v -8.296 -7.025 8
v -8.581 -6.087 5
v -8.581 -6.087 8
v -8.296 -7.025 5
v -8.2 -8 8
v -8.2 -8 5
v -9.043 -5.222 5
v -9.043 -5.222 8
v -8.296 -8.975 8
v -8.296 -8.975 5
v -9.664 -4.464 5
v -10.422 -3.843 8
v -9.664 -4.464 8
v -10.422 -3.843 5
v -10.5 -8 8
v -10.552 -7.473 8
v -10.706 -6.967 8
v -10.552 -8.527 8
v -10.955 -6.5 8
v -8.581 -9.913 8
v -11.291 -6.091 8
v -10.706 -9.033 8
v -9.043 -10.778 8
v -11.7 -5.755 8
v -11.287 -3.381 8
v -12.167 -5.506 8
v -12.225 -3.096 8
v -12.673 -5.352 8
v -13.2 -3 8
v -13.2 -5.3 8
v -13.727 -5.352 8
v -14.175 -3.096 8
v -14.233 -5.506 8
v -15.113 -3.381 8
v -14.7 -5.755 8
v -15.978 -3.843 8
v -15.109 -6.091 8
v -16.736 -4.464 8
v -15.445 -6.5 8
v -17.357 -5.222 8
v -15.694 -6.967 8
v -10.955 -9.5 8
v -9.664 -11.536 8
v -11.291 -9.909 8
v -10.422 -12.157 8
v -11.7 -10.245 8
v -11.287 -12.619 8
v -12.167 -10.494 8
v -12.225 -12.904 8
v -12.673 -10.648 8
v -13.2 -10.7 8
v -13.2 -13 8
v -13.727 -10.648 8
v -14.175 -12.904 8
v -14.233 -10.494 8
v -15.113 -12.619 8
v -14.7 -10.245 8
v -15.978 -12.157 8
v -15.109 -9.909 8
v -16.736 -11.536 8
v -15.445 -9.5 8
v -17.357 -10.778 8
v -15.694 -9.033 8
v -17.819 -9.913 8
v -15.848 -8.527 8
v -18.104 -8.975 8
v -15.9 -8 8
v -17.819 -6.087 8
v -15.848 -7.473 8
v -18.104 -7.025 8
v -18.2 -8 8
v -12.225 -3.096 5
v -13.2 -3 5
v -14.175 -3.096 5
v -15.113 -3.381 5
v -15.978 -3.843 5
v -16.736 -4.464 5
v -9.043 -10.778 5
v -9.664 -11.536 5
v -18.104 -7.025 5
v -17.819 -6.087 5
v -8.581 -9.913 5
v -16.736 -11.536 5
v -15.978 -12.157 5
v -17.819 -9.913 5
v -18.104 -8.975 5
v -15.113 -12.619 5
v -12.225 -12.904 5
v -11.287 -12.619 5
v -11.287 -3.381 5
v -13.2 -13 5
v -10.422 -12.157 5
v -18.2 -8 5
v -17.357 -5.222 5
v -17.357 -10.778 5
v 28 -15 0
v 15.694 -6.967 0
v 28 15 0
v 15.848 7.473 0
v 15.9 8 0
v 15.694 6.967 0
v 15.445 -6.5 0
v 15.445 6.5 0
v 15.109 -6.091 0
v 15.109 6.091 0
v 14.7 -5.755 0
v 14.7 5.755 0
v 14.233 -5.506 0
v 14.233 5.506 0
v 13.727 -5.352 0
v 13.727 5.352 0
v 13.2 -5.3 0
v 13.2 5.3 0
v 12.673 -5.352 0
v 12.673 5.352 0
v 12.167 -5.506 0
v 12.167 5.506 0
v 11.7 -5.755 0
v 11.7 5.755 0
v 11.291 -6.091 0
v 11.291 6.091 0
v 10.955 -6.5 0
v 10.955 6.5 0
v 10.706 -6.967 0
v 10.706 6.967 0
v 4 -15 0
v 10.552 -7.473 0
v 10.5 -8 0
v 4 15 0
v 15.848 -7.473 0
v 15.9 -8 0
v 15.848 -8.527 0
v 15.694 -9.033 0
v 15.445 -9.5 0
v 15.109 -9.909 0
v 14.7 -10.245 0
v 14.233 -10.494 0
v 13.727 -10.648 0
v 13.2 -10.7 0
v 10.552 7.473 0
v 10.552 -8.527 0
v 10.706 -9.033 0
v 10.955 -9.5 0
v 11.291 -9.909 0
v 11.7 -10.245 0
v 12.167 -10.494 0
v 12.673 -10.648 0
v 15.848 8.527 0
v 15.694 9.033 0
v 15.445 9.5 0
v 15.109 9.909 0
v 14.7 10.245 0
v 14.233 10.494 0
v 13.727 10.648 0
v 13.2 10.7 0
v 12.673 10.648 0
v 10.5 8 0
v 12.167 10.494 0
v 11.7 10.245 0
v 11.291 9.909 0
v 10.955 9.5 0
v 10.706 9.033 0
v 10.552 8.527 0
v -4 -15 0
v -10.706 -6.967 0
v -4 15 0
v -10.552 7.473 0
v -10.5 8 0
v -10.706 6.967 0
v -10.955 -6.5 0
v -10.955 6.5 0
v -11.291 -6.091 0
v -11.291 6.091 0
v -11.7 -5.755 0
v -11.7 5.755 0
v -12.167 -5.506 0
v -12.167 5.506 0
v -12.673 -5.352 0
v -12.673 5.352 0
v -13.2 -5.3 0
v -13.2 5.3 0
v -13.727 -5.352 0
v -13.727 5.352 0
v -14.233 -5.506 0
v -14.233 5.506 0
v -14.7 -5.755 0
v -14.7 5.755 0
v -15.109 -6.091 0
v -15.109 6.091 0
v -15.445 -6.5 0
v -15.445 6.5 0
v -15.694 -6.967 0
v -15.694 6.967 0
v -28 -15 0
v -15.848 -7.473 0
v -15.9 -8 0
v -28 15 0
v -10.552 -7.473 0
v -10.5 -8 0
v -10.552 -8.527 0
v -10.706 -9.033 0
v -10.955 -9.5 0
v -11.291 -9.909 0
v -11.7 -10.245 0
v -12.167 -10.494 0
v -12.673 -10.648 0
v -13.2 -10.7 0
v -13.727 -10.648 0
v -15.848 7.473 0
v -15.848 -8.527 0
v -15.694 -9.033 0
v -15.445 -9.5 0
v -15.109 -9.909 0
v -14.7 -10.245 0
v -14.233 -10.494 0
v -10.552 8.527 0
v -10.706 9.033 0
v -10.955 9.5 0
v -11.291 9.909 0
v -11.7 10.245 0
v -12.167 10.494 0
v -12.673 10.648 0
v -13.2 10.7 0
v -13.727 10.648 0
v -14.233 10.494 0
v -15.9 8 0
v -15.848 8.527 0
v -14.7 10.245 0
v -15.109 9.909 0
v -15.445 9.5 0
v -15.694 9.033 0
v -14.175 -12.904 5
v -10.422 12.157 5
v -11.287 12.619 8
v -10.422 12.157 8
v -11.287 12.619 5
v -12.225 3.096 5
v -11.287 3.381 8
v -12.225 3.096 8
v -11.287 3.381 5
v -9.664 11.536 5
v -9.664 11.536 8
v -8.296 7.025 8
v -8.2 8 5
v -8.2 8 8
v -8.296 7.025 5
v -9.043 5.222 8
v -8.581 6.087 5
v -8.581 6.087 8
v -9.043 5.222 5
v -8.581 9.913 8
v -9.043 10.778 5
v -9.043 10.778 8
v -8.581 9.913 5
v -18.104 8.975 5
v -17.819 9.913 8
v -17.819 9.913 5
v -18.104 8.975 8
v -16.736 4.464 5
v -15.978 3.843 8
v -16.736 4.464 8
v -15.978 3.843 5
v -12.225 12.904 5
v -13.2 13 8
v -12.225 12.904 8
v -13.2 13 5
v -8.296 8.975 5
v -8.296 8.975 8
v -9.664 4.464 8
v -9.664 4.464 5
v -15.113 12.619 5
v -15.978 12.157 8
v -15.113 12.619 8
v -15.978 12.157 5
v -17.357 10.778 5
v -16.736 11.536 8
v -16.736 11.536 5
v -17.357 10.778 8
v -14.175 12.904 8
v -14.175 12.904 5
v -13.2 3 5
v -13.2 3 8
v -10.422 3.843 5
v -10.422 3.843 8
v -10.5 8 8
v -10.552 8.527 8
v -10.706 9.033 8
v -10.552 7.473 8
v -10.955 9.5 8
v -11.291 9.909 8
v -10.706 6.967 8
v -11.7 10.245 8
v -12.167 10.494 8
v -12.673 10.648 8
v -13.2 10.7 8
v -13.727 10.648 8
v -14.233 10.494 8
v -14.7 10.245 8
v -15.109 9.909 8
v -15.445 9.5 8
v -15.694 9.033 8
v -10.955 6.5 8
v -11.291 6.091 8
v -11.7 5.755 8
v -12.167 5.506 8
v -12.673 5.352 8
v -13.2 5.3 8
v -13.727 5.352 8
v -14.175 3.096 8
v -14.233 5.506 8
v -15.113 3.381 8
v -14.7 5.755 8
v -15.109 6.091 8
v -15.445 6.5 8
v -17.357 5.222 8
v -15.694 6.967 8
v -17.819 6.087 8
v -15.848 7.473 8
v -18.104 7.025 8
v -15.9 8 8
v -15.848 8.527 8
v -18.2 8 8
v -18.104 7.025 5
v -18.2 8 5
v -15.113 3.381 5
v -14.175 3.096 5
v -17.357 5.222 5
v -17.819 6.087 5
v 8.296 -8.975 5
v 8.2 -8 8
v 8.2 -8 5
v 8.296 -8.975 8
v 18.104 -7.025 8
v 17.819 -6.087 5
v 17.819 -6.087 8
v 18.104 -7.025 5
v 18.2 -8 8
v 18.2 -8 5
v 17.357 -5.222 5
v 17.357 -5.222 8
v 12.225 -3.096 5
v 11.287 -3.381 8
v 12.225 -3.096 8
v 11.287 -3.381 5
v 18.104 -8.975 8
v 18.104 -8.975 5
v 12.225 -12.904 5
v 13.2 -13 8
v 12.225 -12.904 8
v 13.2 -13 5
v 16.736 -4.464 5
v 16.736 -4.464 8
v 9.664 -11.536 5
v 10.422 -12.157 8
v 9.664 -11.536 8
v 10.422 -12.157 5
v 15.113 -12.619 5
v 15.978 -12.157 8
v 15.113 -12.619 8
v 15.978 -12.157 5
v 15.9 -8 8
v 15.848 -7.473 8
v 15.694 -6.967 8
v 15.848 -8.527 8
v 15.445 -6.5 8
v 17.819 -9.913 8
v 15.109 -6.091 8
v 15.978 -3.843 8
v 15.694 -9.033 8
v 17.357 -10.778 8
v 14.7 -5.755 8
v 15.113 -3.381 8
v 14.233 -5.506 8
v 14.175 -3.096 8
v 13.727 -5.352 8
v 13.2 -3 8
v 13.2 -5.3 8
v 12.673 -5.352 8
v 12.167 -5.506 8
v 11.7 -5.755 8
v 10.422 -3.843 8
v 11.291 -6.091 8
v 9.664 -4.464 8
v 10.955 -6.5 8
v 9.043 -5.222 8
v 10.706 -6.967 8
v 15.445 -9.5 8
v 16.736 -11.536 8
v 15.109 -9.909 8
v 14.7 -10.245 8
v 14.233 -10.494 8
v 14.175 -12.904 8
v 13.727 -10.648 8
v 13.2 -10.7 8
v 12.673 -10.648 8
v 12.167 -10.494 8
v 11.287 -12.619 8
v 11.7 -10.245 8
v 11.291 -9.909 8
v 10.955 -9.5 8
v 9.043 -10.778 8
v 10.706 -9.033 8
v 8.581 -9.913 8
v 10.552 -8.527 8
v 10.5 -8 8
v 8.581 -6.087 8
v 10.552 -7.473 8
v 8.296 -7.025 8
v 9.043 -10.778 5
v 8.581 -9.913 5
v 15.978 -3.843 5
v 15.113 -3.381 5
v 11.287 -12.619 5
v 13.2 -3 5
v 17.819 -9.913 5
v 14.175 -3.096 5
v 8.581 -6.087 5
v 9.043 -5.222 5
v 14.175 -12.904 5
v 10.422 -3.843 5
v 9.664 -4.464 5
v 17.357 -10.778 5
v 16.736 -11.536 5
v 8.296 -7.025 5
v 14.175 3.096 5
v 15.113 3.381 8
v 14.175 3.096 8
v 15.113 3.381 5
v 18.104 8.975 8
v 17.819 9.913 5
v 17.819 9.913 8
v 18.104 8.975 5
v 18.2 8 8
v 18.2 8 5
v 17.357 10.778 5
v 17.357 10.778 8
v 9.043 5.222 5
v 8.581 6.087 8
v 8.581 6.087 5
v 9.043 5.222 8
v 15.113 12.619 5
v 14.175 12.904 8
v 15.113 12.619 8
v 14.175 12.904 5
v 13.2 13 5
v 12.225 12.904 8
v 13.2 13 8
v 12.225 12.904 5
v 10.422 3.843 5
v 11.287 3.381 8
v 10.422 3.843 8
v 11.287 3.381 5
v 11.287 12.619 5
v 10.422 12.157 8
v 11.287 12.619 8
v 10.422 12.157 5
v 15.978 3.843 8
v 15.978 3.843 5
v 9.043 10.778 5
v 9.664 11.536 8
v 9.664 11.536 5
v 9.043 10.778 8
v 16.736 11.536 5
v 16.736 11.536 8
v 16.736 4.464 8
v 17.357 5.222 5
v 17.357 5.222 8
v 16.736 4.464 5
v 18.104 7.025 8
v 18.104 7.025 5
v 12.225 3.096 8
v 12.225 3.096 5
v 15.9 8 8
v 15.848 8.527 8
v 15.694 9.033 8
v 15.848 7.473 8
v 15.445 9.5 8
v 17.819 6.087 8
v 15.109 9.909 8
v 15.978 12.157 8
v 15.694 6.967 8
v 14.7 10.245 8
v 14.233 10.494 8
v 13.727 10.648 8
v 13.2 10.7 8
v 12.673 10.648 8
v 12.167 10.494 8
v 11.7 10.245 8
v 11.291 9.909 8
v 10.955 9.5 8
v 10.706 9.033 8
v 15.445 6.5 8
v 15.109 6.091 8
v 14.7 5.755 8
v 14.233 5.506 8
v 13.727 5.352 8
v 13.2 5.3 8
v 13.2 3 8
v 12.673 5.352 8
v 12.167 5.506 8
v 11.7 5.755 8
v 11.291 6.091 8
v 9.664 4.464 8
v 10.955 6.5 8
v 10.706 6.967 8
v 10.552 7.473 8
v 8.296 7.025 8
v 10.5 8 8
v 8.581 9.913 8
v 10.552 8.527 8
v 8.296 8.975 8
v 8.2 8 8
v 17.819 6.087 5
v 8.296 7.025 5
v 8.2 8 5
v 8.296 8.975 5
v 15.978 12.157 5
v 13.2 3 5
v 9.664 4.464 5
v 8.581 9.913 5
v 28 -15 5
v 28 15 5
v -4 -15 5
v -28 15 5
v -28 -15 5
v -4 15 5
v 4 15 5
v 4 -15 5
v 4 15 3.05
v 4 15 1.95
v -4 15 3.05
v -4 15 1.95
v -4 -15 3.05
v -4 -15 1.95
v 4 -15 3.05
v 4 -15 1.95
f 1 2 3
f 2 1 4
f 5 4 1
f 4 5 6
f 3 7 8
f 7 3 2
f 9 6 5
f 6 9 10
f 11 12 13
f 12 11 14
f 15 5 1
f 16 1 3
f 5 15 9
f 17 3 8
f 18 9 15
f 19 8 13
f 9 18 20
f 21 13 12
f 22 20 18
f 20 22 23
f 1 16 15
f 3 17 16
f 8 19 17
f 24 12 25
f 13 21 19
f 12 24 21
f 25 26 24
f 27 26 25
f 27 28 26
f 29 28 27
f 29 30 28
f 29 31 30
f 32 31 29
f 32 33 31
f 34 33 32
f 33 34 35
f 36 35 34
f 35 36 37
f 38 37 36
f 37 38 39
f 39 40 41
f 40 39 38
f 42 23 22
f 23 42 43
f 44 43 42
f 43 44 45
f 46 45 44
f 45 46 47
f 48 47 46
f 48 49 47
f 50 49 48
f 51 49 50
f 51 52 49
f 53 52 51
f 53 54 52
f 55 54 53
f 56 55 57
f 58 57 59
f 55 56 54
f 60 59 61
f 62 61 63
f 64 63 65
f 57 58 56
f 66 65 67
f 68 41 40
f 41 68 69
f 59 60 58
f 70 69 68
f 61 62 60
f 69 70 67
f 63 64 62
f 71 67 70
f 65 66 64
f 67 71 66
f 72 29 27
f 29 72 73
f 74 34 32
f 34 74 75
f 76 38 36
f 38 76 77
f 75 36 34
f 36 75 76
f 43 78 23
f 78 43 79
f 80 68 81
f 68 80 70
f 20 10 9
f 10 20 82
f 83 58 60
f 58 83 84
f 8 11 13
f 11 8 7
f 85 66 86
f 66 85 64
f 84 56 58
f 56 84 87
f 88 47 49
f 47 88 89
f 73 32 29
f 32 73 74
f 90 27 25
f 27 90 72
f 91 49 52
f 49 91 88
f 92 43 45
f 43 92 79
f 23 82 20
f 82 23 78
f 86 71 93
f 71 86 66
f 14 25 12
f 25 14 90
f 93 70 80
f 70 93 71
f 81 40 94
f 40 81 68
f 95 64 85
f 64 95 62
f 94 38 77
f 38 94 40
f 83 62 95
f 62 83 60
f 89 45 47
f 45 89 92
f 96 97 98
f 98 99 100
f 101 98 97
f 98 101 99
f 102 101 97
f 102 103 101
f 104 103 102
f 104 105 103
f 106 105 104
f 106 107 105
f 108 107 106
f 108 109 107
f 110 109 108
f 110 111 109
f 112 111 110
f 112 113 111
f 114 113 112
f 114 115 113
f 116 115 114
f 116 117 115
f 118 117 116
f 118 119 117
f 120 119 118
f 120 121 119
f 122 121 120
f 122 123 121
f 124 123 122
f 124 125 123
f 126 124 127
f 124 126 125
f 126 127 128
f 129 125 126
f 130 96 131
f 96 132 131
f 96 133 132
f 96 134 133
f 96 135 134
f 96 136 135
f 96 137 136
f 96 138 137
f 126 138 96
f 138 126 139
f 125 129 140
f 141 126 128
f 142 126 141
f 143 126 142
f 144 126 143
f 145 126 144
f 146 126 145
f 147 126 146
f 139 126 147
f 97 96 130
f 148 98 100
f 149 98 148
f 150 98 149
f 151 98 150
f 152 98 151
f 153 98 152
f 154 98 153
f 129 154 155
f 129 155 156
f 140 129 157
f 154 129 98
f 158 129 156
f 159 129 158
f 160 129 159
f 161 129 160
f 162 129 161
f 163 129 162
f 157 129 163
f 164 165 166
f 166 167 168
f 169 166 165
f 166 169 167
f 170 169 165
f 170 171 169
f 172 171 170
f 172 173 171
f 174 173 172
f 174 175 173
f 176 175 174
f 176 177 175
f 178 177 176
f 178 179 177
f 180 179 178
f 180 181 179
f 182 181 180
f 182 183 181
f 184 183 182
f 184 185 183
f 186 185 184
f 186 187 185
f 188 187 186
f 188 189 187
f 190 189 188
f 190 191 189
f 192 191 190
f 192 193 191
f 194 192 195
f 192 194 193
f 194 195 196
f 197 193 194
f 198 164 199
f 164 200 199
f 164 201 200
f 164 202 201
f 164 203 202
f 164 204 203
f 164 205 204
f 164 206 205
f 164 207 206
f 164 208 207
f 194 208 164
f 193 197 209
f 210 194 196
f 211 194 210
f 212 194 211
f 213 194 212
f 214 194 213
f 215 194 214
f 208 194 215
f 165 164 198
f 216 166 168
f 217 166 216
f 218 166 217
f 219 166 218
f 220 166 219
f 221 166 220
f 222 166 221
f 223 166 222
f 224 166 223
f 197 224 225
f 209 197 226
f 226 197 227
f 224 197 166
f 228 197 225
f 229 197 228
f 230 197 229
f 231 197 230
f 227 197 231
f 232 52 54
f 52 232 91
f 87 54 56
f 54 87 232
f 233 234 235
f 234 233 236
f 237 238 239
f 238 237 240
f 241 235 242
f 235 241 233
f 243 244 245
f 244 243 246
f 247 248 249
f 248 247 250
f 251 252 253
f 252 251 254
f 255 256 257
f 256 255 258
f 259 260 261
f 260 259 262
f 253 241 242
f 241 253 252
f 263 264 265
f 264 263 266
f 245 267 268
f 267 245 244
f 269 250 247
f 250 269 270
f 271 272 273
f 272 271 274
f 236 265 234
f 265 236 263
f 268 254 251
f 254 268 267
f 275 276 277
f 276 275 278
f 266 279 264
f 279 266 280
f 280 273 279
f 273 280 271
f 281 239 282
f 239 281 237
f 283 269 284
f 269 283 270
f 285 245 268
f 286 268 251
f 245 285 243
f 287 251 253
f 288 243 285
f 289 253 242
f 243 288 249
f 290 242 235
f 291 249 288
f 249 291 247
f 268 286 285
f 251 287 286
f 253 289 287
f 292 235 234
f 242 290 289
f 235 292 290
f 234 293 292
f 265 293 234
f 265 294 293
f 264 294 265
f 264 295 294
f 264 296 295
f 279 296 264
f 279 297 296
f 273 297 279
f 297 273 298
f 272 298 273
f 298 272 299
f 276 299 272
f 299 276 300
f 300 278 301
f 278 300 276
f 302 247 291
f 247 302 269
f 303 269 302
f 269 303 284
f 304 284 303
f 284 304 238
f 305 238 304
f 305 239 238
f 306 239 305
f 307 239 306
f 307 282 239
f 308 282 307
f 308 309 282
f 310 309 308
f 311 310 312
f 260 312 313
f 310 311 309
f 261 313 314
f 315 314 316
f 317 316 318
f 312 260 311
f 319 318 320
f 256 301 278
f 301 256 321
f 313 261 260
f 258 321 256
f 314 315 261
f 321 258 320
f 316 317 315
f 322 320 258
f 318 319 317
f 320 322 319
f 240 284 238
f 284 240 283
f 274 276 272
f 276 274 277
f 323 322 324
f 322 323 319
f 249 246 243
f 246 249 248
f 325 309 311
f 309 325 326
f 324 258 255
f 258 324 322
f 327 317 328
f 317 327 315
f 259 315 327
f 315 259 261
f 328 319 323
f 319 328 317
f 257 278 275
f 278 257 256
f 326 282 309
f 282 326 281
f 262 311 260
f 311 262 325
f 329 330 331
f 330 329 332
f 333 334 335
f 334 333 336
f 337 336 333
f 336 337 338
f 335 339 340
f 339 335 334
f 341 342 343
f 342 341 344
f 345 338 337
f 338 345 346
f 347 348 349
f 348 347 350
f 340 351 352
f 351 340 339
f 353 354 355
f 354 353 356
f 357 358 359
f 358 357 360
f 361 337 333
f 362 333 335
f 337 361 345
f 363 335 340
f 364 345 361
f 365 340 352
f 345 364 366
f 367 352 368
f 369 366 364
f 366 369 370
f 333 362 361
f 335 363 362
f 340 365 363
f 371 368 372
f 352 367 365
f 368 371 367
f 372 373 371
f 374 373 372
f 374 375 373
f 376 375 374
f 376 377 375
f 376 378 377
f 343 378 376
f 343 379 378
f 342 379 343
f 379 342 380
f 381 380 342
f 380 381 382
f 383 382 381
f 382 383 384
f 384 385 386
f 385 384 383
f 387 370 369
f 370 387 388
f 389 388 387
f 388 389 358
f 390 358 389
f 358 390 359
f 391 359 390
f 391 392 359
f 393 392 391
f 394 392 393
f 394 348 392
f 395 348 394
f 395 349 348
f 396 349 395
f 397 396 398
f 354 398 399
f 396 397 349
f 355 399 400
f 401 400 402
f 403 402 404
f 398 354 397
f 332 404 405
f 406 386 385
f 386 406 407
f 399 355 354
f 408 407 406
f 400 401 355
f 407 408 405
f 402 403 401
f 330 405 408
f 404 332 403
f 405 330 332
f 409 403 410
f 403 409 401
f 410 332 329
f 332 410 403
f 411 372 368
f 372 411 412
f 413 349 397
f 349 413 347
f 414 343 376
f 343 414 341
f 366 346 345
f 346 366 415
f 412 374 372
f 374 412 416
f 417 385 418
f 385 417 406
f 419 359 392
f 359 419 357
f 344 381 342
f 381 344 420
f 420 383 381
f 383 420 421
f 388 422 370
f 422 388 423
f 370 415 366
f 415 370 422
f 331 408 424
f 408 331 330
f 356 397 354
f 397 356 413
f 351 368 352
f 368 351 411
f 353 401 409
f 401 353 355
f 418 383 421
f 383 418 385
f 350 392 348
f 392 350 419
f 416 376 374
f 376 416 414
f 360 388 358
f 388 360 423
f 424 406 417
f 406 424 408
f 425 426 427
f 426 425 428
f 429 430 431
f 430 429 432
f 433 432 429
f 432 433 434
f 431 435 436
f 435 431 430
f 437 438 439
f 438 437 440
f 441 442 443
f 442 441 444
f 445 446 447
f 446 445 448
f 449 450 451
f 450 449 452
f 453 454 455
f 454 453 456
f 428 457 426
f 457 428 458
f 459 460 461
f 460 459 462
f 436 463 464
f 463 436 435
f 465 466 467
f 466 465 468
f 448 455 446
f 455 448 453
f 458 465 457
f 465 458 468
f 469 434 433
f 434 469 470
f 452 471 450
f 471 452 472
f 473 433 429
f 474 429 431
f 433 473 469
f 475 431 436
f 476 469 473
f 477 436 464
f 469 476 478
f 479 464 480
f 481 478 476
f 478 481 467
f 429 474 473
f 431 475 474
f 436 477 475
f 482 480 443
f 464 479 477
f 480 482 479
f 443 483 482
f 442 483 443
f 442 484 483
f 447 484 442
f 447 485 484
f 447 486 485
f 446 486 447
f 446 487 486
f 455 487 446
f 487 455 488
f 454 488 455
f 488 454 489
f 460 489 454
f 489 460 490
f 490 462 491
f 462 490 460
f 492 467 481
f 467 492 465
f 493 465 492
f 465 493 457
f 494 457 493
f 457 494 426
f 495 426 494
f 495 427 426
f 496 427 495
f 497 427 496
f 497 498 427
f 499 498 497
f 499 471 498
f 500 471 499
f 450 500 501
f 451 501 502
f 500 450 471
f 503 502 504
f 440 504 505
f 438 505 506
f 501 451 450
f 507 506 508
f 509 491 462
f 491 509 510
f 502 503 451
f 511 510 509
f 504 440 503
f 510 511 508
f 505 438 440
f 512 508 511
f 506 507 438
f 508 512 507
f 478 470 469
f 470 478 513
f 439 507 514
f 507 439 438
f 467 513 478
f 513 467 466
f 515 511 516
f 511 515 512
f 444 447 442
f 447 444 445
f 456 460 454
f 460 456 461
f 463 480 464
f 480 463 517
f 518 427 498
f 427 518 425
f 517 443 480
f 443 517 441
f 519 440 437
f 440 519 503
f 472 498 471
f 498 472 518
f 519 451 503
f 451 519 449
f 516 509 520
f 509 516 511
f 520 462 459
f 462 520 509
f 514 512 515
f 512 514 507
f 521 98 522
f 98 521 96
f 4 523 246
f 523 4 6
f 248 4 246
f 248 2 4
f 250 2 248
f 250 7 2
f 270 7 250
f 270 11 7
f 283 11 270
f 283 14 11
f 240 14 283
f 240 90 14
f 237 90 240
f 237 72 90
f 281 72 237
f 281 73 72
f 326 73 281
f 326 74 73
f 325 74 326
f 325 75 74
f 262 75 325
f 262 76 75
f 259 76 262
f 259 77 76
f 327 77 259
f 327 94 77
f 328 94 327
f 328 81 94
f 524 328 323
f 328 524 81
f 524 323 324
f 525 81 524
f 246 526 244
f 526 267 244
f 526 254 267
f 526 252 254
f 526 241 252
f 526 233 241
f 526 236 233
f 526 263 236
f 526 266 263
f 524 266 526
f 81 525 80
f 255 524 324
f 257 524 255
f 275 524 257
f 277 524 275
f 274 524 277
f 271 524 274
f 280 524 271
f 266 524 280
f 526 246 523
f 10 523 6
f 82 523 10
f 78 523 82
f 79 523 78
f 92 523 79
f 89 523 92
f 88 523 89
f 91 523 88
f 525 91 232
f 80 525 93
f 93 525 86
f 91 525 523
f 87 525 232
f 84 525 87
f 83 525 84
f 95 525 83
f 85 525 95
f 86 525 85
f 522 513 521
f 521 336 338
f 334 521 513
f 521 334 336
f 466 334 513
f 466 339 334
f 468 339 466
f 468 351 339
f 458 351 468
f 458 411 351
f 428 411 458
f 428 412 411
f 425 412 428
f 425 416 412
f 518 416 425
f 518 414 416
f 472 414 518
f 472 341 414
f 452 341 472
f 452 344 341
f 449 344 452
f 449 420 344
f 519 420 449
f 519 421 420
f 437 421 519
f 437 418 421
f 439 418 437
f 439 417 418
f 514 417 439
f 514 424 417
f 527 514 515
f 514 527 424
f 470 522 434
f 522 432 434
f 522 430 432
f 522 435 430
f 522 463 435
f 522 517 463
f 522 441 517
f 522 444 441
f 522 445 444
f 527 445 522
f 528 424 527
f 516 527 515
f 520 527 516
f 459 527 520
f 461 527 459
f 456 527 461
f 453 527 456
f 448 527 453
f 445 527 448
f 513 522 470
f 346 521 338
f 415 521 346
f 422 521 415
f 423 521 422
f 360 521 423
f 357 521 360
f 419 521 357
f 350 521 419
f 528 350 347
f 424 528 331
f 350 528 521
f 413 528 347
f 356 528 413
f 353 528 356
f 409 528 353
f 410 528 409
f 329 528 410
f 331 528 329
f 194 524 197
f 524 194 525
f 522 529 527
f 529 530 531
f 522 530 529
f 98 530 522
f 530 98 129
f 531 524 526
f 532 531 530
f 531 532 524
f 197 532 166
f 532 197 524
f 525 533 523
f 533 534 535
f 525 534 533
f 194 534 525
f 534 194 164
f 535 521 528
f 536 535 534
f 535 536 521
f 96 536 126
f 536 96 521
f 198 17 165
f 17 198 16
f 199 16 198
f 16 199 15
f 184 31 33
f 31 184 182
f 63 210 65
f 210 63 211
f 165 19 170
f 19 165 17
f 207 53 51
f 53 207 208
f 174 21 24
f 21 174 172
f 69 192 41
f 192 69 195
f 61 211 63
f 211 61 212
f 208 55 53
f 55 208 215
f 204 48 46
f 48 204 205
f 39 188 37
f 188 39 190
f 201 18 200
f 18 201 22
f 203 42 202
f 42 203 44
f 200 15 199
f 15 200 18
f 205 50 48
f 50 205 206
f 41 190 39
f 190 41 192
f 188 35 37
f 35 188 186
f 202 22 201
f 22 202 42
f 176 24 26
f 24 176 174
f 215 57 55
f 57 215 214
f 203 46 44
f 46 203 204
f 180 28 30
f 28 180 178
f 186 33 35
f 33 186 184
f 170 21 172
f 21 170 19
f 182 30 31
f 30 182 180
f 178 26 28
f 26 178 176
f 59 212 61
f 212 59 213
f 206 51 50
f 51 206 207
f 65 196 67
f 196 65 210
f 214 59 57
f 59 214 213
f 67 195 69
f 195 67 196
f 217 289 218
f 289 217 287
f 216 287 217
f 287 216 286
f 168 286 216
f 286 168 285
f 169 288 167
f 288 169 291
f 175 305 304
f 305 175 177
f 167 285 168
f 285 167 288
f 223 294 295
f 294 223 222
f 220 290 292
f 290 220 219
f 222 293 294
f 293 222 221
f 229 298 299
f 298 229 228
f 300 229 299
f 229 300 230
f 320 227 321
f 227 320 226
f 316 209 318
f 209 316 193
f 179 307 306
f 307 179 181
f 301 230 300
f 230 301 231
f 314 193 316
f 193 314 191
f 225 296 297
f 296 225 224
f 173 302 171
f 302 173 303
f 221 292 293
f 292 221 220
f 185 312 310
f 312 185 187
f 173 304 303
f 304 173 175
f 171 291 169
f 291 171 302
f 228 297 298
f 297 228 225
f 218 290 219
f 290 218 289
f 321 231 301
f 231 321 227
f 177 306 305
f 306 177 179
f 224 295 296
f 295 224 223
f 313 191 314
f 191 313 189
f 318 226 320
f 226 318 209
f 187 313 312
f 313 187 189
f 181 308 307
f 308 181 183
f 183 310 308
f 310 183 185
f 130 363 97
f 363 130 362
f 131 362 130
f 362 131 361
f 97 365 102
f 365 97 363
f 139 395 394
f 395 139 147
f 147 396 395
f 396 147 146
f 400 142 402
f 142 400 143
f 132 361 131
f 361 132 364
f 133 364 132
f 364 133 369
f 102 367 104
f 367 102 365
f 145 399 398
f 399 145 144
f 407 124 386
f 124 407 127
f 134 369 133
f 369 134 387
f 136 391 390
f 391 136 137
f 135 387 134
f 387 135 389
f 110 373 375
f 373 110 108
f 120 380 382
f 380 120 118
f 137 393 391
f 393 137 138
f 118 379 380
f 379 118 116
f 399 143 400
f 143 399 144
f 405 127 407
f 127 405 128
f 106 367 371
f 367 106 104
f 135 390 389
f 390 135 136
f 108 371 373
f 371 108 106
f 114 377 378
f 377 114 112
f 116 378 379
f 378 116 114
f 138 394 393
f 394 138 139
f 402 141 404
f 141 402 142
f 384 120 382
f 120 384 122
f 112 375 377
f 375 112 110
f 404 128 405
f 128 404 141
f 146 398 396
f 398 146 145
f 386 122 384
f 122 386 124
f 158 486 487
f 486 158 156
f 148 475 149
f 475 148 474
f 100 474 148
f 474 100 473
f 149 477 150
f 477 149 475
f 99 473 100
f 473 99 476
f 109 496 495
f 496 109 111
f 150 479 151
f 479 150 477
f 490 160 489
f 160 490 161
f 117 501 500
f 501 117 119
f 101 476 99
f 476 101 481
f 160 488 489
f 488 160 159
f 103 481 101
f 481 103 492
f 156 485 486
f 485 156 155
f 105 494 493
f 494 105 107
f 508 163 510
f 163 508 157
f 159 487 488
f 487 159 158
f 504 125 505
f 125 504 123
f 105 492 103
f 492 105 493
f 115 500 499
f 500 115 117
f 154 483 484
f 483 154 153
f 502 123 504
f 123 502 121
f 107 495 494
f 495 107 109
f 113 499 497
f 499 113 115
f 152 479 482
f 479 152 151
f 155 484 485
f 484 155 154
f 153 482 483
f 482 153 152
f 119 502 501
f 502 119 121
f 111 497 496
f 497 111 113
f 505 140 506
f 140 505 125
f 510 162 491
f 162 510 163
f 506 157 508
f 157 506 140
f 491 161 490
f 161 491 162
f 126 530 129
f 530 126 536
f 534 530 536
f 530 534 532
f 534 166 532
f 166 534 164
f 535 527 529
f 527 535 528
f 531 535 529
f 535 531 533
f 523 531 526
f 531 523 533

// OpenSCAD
$fn = 32;

// ----------------------------------------------------------------------
// Living hinge: 56 x 30 mm plates, 1.1 mm flexible web
// ----------------------------------------------------------------------

// --- parameters (mm) ---
plate_len = 24;           // plate length outside the web
plate_w = 30;             // plate width
thick = 5;                // plate thickness
web_half = 4;             // half width of the flex band
web_t = 1.1;              // flexible web thickness
web_z = 1.95;             // web position inside the thickness
boss_d = 10;              // screw boss diameter
boss_h = 8;               // screw boss height
boss_x = 13.2;            // screw boss distance from the web
screw_d = 5.4;            // screw hole

difference() {
  union() {
    /* one flat strip, later thinned at the middle */
    translate([-28, -15, 0]) cube([56, 30, 5]);
    /* screw bosses, sunk 0.5 mm into the plates */
    for (sx = [-13.2, 13.2]) {
      for (sy = [-8, 8]) {
        translate([sx, sy, 0]) cylinder(h = boss_h, d = boss_d);
      }
    }
  }
  /* channel from below: leaves the web on top of it */
  translate([-4, -17.5, -2.5]) cube([8, 35, 4.45]);
  /* channel from above: thins the web down to web_t */
  translate([-4, -17.5, 3.05]) cube([8, 35, 4.45]);
  /* screw holes through the bosses */
  for (sx = [-13.2, 13.2]) {
    for (sy = [-8, 8]) {
      translate([sx, sy, -2.5]) cylinder(h = boss_h + 5, d = screw_d);
    }
  }
}
